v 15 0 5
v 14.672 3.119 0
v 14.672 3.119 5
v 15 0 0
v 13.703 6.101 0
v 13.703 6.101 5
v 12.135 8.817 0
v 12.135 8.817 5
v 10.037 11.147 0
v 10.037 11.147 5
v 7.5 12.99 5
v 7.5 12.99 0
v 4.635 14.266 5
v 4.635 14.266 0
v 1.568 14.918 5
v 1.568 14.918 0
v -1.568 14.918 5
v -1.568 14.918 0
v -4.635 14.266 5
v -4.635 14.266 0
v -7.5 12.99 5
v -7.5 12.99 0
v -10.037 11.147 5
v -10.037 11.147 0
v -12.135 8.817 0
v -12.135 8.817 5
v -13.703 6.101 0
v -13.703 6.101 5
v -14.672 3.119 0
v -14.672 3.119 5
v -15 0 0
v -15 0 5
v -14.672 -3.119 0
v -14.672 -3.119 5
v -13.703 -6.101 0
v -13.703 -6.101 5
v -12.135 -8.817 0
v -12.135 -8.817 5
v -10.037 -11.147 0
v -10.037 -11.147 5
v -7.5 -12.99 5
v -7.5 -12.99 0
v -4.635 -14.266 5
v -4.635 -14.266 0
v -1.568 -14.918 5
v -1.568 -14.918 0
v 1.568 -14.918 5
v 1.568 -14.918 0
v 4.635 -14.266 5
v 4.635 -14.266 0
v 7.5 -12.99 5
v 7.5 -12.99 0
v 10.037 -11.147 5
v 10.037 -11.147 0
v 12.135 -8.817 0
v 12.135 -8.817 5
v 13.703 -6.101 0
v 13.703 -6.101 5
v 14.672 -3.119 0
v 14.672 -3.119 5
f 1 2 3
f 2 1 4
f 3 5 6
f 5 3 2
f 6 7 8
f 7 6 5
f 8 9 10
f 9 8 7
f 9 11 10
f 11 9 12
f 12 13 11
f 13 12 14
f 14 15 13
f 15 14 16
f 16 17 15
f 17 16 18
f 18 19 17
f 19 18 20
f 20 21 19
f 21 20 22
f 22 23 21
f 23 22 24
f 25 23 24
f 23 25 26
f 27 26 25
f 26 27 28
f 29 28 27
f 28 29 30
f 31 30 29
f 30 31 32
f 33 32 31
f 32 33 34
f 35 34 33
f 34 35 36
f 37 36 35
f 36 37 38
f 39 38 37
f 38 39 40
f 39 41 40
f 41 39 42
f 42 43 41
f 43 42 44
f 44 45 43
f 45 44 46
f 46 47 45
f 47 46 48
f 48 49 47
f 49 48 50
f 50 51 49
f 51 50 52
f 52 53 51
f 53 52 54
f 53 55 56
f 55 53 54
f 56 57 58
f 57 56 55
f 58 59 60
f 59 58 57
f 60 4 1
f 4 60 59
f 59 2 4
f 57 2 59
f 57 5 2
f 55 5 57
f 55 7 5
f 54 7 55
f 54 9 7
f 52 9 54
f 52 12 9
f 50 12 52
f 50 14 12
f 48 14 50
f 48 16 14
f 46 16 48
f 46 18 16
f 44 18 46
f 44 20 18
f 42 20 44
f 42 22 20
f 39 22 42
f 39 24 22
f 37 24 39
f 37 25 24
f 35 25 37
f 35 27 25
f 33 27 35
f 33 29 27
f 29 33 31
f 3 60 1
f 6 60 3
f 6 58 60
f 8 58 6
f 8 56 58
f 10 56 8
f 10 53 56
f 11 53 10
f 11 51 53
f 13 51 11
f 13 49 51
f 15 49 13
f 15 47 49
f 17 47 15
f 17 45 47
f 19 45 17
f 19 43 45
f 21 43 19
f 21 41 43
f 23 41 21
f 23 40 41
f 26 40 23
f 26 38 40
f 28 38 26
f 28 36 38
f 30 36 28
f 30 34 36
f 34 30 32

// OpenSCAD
// Generated by SolidPython 1.0.1 on 2020-07-29 00:46:44


cylinder(h = 5, r1 = 15, r2 = 15);
/***********************************************
*********      SolidPython code:      **********
************************************************
 
# import packages: SolidPython
from solid import *
from solid.utils import *
from itertools import chain, combinations, permutations


class Resize:

    def __init__(self, scad_file):
        self.scad_file = scad_file
        #self.scad_file = import_scad(scad_file)
        # cone/cylinder param:
        self.r1 = 0
        self.r2 = 0
        self.h = 0
        # rectangular prism param:
        self.w = 0
        self.l = 0
        # ellipse param:
        self.r = 0

    # import OpenScad code (file name corresponds to shape)


    # classify shape + parameters
    def assign(self, param1, param2, param3):
        if self.scad_file == 'cone.scad':
            self.r1 = param1
            self.r2 = param2
            self.h = param3
        elif self.scad_file == 'cylinder.scad':
            self.r1 = param1
            self.r2 = param2
            self.h = param3
        elif self.scad_file == 'rectangularPrism.scad':
            self.h = param1
            self.l = param2
            self.w = param3
        else:
            self.r = param1
            self.h = param2

    # resize parameters
    def iterate(self):
        x = range(3, 20, 2)
        i = 1
        if self.scad_file == 'cone.scad':
            tempList = list(permutations(x, 2))
            for temp in tempList:
                param1 = temp[0]
                param2 = temp[1]
                filepath = 'produced_scad_files/' + 'cone' + str(param1) + '_' + str(param2) + '_' + '.scad'
                scad_render_to_file(cylinder(h=param1, r1=param2, r2=0), filepath)

        elif self.scad_file == 'cylinder.scad':
            tempList = list(permutations(x, 3))
            for temp in tempList:
                param1 = temp[0]
                param2 = temp[1]
                filepath = 'produced_scad_files/' + 'cylinder' + str(param1) + '_' + str(param2) + '_' + '.scad'
                scad_render_to_file(cylinder(h=param1, r1=param2, r2=param2), filepath)

        elif self.scad_file == 'rectangularPrism.scad':
            tempList = list(permutations(x, 3))
            for temp in tempList:
                param1 = temp[0]
                param2 = temp[1]
                param3 = temp[2]
                filepath = 'produced_scad_files/' + 'rectangularPrism' + str(param1) + '_' + str(param2) + '_' + str(
                    param3) + '.scad'
                scad_render_to_file(cube(size=(param1, param2, param3)), filepath)

        elif self.scad_file == 'ellipse.scad':
            tempList = list(permutations(x, 4))
            for temp in tempList:
                param1 = temp[0]
                param2 = temp[1]
                param3 = temp[2]
                param4 = temp[3]
                filepath = 'produced_scad_files/' + 'ellipse' + str(param1) + '_' + str(param2) + '_' + str(param3) + '_' + str(param4) + '.scad'
                scad_render_to_file(scale([param1, param2, param3])(sphere(r=param4)), filepath)

    def render_to_scadfile(self):
        scad_render_to_file(scad, 'example.scad') 
 
************************************************/
